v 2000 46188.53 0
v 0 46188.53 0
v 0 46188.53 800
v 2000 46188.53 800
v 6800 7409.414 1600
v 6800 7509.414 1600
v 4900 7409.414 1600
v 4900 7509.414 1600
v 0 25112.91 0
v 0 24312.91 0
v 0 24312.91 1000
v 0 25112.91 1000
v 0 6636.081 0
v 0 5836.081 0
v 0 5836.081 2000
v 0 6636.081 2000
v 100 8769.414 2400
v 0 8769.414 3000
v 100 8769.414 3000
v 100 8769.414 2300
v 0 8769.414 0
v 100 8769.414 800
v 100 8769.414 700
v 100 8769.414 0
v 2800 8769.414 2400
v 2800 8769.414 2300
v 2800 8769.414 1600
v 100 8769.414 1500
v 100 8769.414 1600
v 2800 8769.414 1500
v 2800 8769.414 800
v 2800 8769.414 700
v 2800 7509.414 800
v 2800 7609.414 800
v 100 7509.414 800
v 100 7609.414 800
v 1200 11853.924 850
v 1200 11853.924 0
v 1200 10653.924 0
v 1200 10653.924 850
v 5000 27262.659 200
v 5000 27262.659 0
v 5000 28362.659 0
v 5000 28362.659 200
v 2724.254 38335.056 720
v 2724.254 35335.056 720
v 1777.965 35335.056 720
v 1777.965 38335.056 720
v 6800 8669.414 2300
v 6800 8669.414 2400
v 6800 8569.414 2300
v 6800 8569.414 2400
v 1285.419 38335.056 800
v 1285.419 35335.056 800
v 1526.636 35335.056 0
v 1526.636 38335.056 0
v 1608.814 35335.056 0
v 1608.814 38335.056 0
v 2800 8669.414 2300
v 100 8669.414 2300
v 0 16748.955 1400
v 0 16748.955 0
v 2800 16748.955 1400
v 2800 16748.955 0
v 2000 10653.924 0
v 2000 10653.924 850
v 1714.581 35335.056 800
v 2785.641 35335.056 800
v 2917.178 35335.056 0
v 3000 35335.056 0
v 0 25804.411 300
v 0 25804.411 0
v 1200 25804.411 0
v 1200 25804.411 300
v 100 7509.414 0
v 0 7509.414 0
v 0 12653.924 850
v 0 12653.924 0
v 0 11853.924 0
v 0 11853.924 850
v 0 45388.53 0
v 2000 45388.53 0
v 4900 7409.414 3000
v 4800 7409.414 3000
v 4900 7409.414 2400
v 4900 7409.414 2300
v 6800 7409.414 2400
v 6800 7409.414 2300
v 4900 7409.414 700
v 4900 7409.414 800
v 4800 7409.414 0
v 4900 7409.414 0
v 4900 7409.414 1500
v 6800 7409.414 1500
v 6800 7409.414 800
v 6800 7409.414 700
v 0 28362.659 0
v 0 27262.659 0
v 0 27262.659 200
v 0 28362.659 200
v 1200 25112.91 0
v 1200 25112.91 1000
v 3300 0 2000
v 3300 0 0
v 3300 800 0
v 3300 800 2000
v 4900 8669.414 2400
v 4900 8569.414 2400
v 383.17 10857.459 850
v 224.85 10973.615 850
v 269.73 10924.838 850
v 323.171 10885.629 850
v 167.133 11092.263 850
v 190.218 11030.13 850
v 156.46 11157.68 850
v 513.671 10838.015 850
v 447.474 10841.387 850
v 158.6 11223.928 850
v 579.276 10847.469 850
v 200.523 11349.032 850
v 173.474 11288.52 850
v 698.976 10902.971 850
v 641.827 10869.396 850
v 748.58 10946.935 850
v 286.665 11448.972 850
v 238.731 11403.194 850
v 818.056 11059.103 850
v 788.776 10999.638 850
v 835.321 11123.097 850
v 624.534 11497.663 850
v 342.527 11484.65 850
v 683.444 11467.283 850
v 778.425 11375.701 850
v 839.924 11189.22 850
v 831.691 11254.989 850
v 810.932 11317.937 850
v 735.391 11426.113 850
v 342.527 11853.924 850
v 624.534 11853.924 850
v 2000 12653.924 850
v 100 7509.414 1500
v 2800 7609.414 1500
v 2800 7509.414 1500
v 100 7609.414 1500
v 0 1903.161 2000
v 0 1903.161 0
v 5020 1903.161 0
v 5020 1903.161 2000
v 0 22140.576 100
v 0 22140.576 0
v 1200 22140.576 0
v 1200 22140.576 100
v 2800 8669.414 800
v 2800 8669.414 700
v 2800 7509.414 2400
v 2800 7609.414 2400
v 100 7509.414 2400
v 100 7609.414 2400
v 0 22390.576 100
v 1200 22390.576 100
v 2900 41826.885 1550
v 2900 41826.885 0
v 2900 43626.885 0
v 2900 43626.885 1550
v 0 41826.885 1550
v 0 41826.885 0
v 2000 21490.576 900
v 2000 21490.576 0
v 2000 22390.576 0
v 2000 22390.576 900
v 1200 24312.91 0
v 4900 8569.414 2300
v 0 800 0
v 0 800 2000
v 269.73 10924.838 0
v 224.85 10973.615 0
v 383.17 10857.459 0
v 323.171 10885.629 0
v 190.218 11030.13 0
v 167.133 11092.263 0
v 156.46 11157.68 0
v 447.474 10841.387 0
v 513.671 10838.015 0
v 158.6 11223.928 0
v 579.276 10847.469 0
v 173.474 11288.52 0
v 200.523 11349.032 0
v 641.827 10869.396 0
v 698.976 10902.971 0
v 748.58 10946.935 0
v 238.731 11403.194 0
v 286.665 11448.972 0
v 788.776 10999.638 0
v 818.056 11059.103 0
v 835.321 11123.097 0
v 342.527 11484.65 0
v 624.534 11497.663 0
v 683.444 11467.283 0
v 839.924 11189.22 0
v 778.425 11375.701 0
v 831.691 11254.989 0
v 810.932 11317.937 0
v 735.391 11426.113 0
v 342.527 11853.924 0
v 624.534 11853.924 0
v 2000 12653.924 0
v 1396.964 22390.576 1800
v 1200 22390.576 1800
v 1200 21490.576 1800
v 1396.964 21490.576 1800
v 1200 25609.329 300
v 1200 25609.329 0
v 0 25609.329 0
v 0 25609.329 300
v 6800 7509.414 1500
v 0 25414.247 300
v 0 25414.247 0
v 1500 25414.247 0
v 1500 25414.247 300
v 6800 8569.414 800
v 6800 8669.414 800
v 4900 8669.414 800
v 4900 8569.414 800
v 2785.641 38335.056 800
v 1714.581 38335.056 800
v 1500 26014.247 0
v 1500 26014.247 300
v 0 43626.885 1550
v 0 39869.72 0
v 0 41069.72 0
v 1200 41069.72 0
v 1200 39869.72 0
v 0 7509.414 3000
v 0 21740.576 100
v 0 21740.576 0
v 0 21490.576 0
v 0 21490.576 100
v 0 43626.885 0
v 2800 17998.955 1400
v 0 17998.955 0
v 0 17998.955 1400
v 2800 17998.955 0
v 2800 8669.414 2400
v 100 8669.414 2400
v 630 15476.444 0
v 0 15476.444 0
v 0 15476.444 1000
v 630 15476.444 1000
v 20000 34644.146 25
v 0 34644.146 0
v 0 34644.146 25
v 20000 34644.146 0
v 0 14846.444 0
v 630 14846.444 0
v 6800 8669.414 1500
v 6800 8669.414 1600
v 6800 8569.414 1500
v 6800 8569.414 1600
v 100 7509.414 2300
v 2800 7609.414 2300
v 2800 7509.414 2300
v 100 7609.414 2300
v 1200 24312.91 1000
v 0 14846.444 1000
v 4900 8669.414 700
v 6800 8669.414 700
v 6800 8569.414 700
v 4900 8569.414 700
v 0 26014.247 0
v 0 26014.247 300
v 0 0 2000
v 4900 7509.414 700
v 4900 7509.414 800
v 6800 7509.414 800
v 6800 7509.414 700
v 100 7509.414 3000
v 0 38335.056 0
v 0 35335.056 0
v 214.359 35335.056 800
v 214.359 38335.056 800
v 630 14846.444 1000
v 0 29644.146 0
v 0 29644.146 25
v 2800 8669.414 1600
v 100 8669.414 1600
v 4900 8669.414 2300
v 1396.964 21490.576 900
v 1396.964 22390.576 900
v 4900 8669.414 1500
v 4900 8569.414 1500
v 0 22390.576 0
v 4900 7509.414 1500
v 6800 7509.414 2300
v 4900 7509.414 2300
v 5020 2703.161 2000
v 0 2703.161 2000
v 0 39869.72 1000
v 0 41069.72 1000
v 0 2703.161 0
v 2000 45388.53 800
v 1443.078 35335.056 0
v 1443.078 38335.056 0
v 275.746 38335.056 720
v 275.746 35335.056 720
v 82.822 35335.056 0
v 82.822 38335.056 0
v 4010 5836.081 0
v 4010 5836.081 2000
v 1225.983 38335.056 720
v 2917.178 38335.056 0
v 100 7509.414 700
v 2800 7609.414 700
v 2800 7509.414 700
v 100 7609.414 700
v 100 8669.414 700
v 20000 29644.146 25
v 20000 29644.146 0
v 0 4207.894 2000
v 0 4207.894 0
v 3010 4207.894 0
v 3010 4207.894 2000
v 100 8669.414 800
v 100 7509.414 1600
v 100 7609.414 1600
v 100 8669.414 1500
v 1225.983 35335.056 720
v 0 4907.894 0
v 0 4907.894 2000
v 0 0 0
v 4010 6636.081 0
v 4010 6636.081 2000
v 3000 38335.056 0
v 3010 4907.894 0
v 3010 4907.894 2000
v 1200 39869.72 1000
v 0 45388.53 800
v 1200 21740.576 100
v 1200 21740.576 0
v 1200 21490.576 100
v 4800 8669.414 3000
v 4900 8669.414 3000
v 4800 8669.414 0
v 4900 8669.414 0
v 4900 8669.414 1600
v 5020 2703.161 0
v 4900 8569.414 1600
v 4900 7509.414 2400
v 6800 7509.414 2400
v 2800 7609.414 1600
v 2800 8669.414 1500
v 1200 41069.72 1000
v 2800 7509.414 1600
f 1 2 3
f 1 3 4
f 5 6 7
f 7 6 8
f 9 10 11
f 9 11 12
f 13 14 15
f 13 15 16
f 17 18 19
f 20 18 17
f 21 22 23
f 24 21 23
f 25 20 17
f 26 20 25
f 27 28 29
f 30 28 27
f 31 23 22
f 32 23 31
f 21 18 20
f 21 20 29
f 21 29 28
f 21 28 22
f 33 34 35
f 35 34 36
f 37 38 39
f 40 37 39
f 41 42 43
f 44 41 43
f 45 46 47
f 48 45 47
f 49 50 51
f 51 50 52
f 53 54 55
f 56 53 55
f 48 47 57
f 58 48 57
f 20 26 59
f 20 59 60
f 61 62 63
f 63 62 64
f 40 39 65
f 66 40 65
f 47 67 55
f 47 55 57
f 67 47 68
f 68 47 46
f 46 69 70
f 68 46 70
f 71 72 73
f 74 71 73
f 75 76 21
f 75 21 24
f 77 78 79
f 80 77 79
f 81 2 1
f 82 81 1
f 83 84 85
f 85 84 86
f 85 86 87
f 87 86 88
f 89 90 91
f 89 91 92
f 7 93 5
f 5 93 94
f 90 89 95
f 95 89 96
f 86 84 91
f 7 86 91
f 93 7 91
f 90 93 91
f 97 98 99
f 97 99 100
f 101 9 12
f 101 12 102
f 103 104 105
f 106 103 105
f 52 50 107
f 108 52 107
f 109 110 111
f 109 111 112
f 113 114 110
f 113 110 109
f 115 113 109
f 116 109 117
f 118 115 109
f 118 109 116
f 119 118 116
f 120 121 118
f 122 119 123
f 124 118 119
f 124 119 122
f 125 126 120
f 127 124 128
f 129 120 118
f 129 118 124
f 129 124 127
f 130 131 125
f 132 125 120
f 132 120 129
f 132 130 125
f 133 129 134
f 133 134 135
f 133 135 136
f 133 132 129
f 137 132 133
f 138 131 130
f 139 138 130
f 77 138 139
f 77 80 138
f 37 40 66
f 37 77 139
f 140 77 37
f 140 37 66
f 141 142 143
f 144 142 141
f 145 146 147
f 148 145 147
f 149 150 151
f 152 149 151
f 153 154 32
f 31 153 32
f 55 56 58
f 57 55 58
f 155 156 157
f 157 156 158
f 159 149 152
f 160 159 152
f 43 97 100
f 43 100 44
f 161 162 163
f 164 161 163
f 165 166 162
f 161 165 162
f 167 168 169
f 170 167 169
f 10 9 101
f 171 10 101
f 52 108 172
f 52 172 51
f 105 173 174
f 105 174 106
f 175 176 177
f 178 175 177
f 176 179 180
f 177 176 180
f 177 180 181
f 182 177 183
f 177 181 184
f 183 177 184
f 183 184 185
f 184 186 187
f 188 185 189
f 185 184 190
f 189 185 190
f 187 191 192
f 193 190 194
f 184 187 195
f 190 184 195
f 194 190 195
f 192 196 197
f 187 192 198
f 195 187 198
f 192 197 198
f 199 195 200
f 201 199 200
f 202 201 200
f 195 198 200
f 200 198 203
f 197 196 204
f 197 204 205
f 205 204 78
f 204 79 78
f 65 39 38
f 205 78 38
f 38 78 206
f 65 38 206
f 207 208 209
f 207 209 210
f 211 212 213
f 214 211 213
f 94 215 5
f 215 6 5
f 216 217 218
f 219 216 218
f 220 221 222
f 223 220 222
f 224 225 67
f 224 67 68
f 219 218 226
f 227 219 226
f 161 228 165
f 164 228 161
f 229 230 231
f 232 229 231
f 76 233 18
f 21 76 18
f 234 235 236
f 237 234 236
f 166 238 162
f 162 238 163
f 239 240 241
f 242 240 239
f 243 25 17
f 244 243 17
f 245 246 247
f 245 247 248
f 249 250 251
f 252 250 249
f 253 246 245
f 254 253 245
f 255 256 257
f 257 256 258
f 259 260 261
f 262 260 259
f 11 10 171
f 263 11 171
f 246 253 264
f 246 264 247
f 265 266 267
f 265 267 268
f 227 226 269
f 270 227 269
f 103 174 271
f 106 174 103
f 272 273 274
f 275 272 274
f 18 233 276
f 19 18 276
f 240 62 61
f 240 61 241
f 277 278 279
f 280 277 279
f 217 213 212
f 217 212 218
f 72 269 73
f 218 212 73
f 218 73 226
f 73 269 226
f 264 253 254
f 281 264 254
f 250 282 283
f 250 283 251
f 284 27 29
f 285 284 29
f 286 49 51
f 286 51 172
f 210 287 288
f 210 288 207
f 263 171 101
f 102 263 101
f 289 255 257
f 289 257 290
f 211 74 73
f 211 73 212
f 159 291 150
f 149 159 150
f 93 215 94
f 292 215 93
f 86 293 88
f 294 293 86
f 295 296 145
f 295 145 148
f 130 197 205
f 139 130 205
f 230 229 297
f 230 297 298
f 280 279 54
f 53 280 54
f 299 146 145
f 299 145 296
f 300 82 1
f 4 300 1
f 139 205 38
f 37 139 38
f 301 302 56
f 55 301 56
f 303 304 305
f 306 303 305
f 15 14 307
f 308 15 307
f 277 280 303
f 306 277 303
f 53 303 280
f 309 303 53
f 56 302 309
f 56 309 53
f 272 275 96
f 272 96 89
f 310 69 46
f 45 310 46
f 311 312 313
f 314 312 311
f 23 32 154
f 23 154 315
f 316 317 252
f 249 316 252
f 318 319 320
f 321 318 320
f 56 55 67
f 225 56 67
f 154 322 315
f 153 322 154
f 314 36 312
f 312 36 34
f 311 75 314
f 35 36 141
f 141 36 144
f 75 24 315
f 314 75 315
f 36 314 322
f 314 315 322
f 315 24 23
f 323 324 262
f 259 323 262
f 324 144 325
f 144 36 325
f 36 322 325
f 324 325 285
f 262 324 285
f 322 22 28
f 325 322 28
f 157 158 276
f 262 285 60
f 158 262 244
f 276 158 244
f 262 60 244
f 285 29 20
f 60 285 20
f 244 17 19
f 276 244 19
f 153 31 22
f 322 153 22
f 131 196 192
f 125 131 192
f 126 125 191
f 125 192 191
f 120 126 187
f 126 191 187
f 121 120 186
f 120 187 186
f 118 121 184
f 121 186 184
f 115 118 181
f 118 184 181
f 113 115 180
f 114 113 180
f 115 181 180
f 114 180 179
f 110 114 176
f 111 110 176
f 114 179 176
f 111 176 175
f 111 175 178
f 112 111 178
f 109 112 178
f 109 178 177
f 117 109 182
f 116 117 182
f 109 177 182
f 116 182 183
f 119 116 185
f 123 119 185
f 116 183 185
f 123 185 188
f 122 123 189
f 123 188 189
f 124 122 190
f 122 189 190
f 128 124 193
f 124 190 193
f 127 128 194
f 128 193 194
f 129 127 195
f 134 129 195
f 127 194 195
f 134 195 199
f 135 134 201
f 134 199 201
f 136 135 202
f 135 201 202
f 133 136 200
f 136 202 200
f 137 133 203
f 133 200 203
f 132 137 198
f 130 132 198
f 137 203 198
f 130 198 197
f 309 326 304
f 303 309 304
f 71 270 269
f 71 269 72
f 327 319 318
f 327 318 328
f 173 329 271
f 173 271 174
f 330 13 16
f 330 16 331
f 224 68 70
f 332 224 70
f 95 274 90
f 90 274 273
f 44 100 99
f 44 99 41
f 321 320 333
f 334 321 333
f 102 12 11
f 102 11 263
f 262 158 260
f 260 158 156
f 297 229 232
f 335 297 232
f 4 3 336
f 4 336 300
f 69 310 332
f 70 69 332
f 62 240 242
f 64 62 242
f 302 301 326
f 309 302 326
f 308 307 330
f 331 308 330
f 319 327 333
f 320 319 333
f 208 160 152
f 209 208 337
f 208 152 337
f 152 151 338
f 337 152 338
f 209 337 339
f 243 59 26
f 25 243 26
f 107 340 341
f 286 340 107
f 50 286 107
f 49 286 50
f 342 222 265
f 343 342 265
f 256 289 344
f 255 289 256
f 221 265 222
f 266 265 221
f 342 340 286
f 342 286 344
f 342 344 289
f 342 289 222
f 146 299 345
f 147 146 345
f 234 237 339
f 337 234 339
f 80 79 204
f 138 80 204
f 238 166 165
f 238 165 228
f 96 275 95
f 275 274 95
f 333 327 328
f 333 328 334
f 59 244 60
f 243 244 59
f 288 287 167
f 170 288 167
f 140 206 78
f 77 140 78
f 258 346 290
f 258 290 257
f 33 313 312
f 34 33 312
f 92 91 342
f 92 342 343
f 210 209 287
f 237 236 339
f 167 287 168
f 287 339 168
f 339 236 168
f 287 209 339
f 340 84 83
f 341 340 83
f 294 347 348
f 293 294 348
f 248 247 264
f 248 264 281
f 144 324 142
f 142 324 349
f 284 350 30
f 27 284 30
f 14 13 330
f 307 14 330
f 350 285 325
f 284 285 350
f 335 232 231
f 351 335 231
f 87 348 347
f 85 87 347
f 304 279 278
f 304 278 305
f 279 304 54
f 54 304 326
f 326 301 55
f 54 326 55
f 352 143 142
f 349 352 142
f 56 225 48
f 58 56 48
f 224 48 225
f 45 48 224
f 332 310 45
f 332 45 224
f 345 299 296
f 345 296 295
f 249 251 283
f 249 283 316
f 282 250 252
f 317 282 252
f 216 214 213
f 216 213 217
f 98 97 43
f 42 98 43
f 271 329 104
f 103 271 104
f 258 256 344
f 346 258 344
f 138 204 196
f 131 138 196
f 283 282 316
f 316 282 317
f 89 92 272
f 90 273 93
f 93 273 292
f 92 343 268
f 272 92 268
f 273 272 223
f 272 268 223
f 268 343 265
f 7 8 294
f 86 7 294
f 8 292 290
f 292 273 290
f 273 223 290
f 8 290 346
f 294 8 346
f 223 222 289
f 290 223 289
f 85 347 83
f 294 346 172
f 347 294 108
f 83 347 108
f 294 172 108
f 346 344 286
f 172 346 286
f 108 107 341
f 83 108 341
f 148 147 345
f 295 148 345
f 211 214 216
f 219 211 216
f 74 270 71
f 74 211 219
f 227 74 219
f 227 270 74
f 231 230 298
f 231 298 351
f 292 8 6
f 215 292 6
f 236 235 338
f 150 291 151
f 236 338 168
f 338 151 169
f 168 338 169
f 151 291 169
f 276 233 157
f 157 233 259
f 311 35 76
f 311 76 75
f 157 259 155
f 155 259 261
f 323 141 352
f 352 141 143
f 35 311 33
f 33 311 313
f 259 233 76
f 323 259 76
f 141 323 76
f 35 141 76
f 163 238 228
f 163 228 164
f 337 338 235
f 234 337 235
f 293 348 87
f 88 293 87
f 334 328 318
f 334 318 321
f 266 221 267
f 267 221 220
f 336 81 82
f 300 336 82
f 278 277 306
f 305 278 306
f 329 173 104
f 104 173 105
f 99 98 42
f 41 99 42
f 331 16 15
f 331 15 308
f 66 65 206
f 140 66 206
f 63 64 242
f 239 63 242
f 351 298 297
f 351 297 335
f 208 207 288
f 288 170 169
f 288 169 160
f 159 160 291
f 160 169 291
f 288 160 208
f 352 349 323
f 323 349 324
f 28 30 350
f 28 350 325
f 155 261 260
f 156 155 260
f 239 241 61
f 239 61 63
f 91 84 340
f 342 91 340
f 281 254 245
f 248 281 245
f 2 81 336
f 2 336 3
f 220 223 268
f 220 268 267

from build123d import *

# Parameters (mm, degrees)
F0_W      = 3300
F0_H      = 800
F1_DEPTH  = 2000
F0_W_2    = 5020
F2_DEPTH  = 2000
F0_W_3    = 3010
F0_H_2    = 700
F3_DEPTH  = 2000
F0_W_4    = 4010
F4_DEPTH  = 2000
F0_W_5    = 2800
F0_H_3    = 1260
F5_DEPTH  = 3000
F6_W      = 2700
F6_H      = 700
F7_DEPTH  = 1260
F8_W      = 2988.0481862915
F8_H      = 1060
F9_DEPTH  = 1700
F10_DEPTH = 850
F0_W_6    = 630
F0_H_4    = 630
F11_DEPTH = 1000
F0_H_5    = 1250
F12_DEPTH = 1400
F13_DEPTH = 1800
F14_W     = 1200
F14_H     = 1700
F14_W_2   = 603.0360460281
F14_H_2   = 900
F15_DEPTH = 900
F16_DEPTH = 300
F0_W_7    = 1200
F17_DEPTH = 1000
F0_W_8    = 5000
F0_H_6    = 1100
F18_DEPTH = 200
F0_W_9    = 20000
F0_H_7    = 5000
F19_DEPTH = 25
F0_W_10   = 3000
F0_H_8    = 3000
F20_DEPTH = 800
F22_DEPTH = 3000
F0_H_9    = 1200
F23_DEPTH = 1000
F25_W     = 800
F25_H     = 100
F26_DEPTH = 2700
F27_W     = 2900
F27_H     = 1800
F28_DEPTH = 1550
F0_W_11   = 2000
F29_DEPTH = 800


# Not quite as in the source:
# - a feature names something its author has since deleted; it is built from what else it names


with BuildPart() as f1:
    # F0 (on Top) → F1 (new body)
    with BuildSketch(Plane.XY):
        with Locations((1650, 400)):
            Rectangle(F0_W, F0_H)
    extrude(amount=F1_DEPTH)


with BuildPart() as f2:
    # F0 (on Top) → F2 (new body)
    with BuildSketch(Plane.XY):
        with Locations((2510, 2303.160572052)):
            Rectangle(F0_W_2, F0_H)
    extrude(amount=F2_DEPTH)


with BuildPart() as f3:
    # F0 (on Top) → F3 (new body)
    with BuildSketch(Plane.XY):
        with Locations((1505, 4557.8938484192)):
            Rectangle(F0_W_3, F0_H_2)
    extrude(amount=F3_DEPTH)


with BuildPart() as f4:
    # F0 (on Top) → F4 (new body)
    with BuildSketch(Plane.XY):
        with Locations((2005, 6236.0805511475)):
            Rectangle(F0_W_4, F0_H)
    extrude(amount=F4_DEPTH)


with BuildPart() as f5:
    # F0 (on Top) → F5 (new body)
    with BuildSketch(Plane.XY):
        with Locations((1400, 8139.4137191772)):
            Rectangle(F0_W_5, F0_H_3)
    extrude(amount=F5_DEPTH)

    # F6 (on face) → F7 (cut, through all)
    with BuildSketch(Plane(origin=(0, 8769.4137191772, 0), x_dir=(-1, 0, 0), z_dir=(0, 1, 0))):
        with Locations((-1450, 350)):
            Rectangle(F6_W, F6_H)
        with Locations((-1450, 1150)):
            Rectangle(F6_W, F6_H)
        with Locations((-1450, 1950)):
            Rectangle(F6_W, F6_H)
        with Locations((-1450, 2750)):
            Rectangle(F6_W, F6_H)
    extrude(amount=-F7_DEPTH, mode=Mode.SUBTRACT)

    # F8 (on face) → F9 (cut, through all)
    with BuildSketch(Plane.XY.offset(2400)):
        with Locations((1594.0240931458, 8139.4137191772)):
            Rectangle(F8_W, F8_H)
    extrude(amount=-F9_DEPTH, mode=Mode.SUBTRACT)


with BuildPart() as f10:
    # F0 (on Top) → F10 (new body)
    with BuildSketch(Plane.XY):
        with BuildLine():
            Line((0, 12653.9237976074), (0, 11853.9237976074))
            Line((0, 11853.9237976074), (342.5268346084, 11853.9237976074))
            Line((342.5268346084, 11853.9237976074), (342.5268346084, 11484.6496938236))
            ThreePointArc((342.5268346084, 11484.6496938236), (513.6710875982, 10838.0149080306), (624.5342638872, 11497.6634945311))
            Line((624.5342638872, 11497.6634945311), (624.5342638872, 11853.9237976074))
            Line((624.5342638872, 11853.9237976074), (1200, 11853.9237976074))
            Line((1200, 11853.9237976074), (1200, 10653.9237976074))
            Line((1200, 10653.9237976074), (2000, 10653.9237976074))
            Line((2000, 10653.9237976074), (2000, 12653.9237976074))
            Line((2000, 12653.9237976074), (0, 12653.9237976074))
        make_face()
    extrude(amount=F10_DEPTH)


with BuildPart() as f11:
    # F0 (on Top) → F11 (new body)
    with BuildSketch(Plane.XY):
        with Locations((315, 15161.4441299438)):
            Rectangle(F0_W_6, F0_H_4)
    extrude(amount=F11_DEPTH)


with BuildPart() as f12:
    # F0 (on Top) → F12 (new body)
    with BuildSketch(Plane.XY):
        with Locations((1400, 17373.9547729492)):
            Rectangle(F0_W_5, F0_H_5)
    extrude(amount=F12_DEPTH)


with BuildPart() as f13:
    # F0 (on Top) → F13 (new body)
    with BuildSketch(Plane.XY):
        Polygon((0, 21740.576171875), (0, 21490.576171875), (2000, 21490.576171875), (2000, 22390.576171875), (0, 22390.576171875), (0, 22140.576171875), (1200, 22140.576171875), (1200, 21740.576171875), align=None)
    extrude(amount=F13_DEPTH)

    # F14 (on face) → F15 (cut, through all)
    with BuildSketch(Plane.XZ.offset(-21490.576171875)):
        with Locations((600, 950)):
            Rectangle(F14_W, F14_H)
        with Locations((1698.4819769859, 1350)):
            Rectangle(F14_W_2, F14_H_2)
    extrude(amount=-F15_DEPTH, mode=Mode.SUBTRACT)


with BuildPart() as f16:
    # F0 (on Top) → F16 (new body)
    with BuildSketch(Plane.XY):
        Polygon((0, 25609.3289375305), (0, 25414.2469406128), (1500, 25414.2469406128), (1500, 26014.2469406128), (0, 26014.2469406128), (0, 25804.4109344482), (1200, 25804.4109344482), (1200, 25609.3289375305), align=None)
    extrude(amount=F16_DEPTH)


with BuildPart() as f17:
    # F0 (on Top) → F17 (new body)
    with BuildSketch(Plane.XY):
        with Locations((600, 24712.9100799561)):
            Rectangle(F0_W_7, F0_H)
    extrude(amount=F17_DEPTH)


with BuildPart() as f18:
    # F0 (on Top) → F18 (new body)
    with BuildSketch(Plane.XY):
        with Locations((2500, 27812.659072876)):
            Rectangle(F0_W_8, F0_H_6)
    extrude(amount=F18_DEPTH)


with BuildPart() as f19:
    # F0 (on Top) → F19 (new body)
    with BuildSketch(Plane.XY):
        with Locations((10000, 32144.1459655762)):
            Rectangle(F0_W_9, F0_H_7)
    extrude(amount=F19_DEPTH)


with BuildPart() as f20:
    # F0 (on Top) → F20 (new body)
    with BuildSketch(Plane.XY):
        with Locations((1500, 36835.0563049316)):
            Rectangle(F0_W_10, F0_H_8)
    extrude(amount=F20_DEPTH)

    # F21 (on face) → F22 (cut, through all)
    with BuildSketch(Plane.XZ.offset(-35335.0563049316)):
        Polygon((0, 800), (0, 0), (214.3593539449, 800), align=None)
        Polygon((1714.5810461517, 800), (1285.4189538483, 800), (1526.6357693569, 0), align=None)
        Polygon((3000, 800), (2785.6406460551, 800), (3000, 0), align=None)
        Polygon((275.7455129832, 720), (82.8220944328, 0), (1443.0782710648, 0), (1225.983137107, 720), align=None)
        Polygon((1777.9645828854, 720), (1608.8138337701, 0), (2917.1779055672, 0), (2724.2544870168, 720), align=None)
    extrude(amount=-F22_DEPTH, mode=Mode.SUBTRACT)


with BuildPart() as f23:
    # F0 (on Top) → F23 (new body)
    with BuildSketch(Plane.XY):
        with Locations((600, 40469.7204589844)):
            Rectangle(F0_W_7, F0_H_9)
    extrude(amount=F23_DEPTH)


with BuildPart() as f24_1:
    # F24: copy of F5
    add(f5.part.moved(Location((4800, -100, 0))))

    # F25 (on face) → F26 (cut)
    with BuildSketch(Plane.XY.offset(2400)):
        Polygon((9301.088013608, 9228.2405896963), (6800, 9228.2405896963), (6800, 7509.4137191772), (7600, 7509.4137191772), (7600, 7409.4137191772), (6800, 7409.4137191772), (6800, 6951.2433008371), (9301.088013608, 6951.2433008371), align=None)
        with Locations((7200, 7459.4137191772)):
            Rectangle(F25_W, F25_H)
    extrude(amount=-F26_DEPTH, mode=Mode.SUBTRACT)


with BuildPart() as f28:
    # F27 (on Top) → F28 (new body)
    with BuildSketch(Plane.XY):
        with Locations((1450, 42726.8852233887)):
            Rectangle(F27_W, F27_H)
    extrude(amount=F28_DEPTH)


with BuildPart() as f29:
    # F0 (on Top) → F29 (new body)
    with BuildSketch(Plane.XY):
        with Locations((1000, 45788.5299682617)):
            Rectangle(F0_W_11, F0_H)
    extrude(amount=F29_DEPTH)


solid = Compound([f1.part, f2.part, f3.part, f4.part, f5.part, f10.part, f11.part, f12.part, f13.part, f16.part, f17.part, f18.part, f19.part, f20.part, f23.part, f24_1.part, f28.part, f29.part])
